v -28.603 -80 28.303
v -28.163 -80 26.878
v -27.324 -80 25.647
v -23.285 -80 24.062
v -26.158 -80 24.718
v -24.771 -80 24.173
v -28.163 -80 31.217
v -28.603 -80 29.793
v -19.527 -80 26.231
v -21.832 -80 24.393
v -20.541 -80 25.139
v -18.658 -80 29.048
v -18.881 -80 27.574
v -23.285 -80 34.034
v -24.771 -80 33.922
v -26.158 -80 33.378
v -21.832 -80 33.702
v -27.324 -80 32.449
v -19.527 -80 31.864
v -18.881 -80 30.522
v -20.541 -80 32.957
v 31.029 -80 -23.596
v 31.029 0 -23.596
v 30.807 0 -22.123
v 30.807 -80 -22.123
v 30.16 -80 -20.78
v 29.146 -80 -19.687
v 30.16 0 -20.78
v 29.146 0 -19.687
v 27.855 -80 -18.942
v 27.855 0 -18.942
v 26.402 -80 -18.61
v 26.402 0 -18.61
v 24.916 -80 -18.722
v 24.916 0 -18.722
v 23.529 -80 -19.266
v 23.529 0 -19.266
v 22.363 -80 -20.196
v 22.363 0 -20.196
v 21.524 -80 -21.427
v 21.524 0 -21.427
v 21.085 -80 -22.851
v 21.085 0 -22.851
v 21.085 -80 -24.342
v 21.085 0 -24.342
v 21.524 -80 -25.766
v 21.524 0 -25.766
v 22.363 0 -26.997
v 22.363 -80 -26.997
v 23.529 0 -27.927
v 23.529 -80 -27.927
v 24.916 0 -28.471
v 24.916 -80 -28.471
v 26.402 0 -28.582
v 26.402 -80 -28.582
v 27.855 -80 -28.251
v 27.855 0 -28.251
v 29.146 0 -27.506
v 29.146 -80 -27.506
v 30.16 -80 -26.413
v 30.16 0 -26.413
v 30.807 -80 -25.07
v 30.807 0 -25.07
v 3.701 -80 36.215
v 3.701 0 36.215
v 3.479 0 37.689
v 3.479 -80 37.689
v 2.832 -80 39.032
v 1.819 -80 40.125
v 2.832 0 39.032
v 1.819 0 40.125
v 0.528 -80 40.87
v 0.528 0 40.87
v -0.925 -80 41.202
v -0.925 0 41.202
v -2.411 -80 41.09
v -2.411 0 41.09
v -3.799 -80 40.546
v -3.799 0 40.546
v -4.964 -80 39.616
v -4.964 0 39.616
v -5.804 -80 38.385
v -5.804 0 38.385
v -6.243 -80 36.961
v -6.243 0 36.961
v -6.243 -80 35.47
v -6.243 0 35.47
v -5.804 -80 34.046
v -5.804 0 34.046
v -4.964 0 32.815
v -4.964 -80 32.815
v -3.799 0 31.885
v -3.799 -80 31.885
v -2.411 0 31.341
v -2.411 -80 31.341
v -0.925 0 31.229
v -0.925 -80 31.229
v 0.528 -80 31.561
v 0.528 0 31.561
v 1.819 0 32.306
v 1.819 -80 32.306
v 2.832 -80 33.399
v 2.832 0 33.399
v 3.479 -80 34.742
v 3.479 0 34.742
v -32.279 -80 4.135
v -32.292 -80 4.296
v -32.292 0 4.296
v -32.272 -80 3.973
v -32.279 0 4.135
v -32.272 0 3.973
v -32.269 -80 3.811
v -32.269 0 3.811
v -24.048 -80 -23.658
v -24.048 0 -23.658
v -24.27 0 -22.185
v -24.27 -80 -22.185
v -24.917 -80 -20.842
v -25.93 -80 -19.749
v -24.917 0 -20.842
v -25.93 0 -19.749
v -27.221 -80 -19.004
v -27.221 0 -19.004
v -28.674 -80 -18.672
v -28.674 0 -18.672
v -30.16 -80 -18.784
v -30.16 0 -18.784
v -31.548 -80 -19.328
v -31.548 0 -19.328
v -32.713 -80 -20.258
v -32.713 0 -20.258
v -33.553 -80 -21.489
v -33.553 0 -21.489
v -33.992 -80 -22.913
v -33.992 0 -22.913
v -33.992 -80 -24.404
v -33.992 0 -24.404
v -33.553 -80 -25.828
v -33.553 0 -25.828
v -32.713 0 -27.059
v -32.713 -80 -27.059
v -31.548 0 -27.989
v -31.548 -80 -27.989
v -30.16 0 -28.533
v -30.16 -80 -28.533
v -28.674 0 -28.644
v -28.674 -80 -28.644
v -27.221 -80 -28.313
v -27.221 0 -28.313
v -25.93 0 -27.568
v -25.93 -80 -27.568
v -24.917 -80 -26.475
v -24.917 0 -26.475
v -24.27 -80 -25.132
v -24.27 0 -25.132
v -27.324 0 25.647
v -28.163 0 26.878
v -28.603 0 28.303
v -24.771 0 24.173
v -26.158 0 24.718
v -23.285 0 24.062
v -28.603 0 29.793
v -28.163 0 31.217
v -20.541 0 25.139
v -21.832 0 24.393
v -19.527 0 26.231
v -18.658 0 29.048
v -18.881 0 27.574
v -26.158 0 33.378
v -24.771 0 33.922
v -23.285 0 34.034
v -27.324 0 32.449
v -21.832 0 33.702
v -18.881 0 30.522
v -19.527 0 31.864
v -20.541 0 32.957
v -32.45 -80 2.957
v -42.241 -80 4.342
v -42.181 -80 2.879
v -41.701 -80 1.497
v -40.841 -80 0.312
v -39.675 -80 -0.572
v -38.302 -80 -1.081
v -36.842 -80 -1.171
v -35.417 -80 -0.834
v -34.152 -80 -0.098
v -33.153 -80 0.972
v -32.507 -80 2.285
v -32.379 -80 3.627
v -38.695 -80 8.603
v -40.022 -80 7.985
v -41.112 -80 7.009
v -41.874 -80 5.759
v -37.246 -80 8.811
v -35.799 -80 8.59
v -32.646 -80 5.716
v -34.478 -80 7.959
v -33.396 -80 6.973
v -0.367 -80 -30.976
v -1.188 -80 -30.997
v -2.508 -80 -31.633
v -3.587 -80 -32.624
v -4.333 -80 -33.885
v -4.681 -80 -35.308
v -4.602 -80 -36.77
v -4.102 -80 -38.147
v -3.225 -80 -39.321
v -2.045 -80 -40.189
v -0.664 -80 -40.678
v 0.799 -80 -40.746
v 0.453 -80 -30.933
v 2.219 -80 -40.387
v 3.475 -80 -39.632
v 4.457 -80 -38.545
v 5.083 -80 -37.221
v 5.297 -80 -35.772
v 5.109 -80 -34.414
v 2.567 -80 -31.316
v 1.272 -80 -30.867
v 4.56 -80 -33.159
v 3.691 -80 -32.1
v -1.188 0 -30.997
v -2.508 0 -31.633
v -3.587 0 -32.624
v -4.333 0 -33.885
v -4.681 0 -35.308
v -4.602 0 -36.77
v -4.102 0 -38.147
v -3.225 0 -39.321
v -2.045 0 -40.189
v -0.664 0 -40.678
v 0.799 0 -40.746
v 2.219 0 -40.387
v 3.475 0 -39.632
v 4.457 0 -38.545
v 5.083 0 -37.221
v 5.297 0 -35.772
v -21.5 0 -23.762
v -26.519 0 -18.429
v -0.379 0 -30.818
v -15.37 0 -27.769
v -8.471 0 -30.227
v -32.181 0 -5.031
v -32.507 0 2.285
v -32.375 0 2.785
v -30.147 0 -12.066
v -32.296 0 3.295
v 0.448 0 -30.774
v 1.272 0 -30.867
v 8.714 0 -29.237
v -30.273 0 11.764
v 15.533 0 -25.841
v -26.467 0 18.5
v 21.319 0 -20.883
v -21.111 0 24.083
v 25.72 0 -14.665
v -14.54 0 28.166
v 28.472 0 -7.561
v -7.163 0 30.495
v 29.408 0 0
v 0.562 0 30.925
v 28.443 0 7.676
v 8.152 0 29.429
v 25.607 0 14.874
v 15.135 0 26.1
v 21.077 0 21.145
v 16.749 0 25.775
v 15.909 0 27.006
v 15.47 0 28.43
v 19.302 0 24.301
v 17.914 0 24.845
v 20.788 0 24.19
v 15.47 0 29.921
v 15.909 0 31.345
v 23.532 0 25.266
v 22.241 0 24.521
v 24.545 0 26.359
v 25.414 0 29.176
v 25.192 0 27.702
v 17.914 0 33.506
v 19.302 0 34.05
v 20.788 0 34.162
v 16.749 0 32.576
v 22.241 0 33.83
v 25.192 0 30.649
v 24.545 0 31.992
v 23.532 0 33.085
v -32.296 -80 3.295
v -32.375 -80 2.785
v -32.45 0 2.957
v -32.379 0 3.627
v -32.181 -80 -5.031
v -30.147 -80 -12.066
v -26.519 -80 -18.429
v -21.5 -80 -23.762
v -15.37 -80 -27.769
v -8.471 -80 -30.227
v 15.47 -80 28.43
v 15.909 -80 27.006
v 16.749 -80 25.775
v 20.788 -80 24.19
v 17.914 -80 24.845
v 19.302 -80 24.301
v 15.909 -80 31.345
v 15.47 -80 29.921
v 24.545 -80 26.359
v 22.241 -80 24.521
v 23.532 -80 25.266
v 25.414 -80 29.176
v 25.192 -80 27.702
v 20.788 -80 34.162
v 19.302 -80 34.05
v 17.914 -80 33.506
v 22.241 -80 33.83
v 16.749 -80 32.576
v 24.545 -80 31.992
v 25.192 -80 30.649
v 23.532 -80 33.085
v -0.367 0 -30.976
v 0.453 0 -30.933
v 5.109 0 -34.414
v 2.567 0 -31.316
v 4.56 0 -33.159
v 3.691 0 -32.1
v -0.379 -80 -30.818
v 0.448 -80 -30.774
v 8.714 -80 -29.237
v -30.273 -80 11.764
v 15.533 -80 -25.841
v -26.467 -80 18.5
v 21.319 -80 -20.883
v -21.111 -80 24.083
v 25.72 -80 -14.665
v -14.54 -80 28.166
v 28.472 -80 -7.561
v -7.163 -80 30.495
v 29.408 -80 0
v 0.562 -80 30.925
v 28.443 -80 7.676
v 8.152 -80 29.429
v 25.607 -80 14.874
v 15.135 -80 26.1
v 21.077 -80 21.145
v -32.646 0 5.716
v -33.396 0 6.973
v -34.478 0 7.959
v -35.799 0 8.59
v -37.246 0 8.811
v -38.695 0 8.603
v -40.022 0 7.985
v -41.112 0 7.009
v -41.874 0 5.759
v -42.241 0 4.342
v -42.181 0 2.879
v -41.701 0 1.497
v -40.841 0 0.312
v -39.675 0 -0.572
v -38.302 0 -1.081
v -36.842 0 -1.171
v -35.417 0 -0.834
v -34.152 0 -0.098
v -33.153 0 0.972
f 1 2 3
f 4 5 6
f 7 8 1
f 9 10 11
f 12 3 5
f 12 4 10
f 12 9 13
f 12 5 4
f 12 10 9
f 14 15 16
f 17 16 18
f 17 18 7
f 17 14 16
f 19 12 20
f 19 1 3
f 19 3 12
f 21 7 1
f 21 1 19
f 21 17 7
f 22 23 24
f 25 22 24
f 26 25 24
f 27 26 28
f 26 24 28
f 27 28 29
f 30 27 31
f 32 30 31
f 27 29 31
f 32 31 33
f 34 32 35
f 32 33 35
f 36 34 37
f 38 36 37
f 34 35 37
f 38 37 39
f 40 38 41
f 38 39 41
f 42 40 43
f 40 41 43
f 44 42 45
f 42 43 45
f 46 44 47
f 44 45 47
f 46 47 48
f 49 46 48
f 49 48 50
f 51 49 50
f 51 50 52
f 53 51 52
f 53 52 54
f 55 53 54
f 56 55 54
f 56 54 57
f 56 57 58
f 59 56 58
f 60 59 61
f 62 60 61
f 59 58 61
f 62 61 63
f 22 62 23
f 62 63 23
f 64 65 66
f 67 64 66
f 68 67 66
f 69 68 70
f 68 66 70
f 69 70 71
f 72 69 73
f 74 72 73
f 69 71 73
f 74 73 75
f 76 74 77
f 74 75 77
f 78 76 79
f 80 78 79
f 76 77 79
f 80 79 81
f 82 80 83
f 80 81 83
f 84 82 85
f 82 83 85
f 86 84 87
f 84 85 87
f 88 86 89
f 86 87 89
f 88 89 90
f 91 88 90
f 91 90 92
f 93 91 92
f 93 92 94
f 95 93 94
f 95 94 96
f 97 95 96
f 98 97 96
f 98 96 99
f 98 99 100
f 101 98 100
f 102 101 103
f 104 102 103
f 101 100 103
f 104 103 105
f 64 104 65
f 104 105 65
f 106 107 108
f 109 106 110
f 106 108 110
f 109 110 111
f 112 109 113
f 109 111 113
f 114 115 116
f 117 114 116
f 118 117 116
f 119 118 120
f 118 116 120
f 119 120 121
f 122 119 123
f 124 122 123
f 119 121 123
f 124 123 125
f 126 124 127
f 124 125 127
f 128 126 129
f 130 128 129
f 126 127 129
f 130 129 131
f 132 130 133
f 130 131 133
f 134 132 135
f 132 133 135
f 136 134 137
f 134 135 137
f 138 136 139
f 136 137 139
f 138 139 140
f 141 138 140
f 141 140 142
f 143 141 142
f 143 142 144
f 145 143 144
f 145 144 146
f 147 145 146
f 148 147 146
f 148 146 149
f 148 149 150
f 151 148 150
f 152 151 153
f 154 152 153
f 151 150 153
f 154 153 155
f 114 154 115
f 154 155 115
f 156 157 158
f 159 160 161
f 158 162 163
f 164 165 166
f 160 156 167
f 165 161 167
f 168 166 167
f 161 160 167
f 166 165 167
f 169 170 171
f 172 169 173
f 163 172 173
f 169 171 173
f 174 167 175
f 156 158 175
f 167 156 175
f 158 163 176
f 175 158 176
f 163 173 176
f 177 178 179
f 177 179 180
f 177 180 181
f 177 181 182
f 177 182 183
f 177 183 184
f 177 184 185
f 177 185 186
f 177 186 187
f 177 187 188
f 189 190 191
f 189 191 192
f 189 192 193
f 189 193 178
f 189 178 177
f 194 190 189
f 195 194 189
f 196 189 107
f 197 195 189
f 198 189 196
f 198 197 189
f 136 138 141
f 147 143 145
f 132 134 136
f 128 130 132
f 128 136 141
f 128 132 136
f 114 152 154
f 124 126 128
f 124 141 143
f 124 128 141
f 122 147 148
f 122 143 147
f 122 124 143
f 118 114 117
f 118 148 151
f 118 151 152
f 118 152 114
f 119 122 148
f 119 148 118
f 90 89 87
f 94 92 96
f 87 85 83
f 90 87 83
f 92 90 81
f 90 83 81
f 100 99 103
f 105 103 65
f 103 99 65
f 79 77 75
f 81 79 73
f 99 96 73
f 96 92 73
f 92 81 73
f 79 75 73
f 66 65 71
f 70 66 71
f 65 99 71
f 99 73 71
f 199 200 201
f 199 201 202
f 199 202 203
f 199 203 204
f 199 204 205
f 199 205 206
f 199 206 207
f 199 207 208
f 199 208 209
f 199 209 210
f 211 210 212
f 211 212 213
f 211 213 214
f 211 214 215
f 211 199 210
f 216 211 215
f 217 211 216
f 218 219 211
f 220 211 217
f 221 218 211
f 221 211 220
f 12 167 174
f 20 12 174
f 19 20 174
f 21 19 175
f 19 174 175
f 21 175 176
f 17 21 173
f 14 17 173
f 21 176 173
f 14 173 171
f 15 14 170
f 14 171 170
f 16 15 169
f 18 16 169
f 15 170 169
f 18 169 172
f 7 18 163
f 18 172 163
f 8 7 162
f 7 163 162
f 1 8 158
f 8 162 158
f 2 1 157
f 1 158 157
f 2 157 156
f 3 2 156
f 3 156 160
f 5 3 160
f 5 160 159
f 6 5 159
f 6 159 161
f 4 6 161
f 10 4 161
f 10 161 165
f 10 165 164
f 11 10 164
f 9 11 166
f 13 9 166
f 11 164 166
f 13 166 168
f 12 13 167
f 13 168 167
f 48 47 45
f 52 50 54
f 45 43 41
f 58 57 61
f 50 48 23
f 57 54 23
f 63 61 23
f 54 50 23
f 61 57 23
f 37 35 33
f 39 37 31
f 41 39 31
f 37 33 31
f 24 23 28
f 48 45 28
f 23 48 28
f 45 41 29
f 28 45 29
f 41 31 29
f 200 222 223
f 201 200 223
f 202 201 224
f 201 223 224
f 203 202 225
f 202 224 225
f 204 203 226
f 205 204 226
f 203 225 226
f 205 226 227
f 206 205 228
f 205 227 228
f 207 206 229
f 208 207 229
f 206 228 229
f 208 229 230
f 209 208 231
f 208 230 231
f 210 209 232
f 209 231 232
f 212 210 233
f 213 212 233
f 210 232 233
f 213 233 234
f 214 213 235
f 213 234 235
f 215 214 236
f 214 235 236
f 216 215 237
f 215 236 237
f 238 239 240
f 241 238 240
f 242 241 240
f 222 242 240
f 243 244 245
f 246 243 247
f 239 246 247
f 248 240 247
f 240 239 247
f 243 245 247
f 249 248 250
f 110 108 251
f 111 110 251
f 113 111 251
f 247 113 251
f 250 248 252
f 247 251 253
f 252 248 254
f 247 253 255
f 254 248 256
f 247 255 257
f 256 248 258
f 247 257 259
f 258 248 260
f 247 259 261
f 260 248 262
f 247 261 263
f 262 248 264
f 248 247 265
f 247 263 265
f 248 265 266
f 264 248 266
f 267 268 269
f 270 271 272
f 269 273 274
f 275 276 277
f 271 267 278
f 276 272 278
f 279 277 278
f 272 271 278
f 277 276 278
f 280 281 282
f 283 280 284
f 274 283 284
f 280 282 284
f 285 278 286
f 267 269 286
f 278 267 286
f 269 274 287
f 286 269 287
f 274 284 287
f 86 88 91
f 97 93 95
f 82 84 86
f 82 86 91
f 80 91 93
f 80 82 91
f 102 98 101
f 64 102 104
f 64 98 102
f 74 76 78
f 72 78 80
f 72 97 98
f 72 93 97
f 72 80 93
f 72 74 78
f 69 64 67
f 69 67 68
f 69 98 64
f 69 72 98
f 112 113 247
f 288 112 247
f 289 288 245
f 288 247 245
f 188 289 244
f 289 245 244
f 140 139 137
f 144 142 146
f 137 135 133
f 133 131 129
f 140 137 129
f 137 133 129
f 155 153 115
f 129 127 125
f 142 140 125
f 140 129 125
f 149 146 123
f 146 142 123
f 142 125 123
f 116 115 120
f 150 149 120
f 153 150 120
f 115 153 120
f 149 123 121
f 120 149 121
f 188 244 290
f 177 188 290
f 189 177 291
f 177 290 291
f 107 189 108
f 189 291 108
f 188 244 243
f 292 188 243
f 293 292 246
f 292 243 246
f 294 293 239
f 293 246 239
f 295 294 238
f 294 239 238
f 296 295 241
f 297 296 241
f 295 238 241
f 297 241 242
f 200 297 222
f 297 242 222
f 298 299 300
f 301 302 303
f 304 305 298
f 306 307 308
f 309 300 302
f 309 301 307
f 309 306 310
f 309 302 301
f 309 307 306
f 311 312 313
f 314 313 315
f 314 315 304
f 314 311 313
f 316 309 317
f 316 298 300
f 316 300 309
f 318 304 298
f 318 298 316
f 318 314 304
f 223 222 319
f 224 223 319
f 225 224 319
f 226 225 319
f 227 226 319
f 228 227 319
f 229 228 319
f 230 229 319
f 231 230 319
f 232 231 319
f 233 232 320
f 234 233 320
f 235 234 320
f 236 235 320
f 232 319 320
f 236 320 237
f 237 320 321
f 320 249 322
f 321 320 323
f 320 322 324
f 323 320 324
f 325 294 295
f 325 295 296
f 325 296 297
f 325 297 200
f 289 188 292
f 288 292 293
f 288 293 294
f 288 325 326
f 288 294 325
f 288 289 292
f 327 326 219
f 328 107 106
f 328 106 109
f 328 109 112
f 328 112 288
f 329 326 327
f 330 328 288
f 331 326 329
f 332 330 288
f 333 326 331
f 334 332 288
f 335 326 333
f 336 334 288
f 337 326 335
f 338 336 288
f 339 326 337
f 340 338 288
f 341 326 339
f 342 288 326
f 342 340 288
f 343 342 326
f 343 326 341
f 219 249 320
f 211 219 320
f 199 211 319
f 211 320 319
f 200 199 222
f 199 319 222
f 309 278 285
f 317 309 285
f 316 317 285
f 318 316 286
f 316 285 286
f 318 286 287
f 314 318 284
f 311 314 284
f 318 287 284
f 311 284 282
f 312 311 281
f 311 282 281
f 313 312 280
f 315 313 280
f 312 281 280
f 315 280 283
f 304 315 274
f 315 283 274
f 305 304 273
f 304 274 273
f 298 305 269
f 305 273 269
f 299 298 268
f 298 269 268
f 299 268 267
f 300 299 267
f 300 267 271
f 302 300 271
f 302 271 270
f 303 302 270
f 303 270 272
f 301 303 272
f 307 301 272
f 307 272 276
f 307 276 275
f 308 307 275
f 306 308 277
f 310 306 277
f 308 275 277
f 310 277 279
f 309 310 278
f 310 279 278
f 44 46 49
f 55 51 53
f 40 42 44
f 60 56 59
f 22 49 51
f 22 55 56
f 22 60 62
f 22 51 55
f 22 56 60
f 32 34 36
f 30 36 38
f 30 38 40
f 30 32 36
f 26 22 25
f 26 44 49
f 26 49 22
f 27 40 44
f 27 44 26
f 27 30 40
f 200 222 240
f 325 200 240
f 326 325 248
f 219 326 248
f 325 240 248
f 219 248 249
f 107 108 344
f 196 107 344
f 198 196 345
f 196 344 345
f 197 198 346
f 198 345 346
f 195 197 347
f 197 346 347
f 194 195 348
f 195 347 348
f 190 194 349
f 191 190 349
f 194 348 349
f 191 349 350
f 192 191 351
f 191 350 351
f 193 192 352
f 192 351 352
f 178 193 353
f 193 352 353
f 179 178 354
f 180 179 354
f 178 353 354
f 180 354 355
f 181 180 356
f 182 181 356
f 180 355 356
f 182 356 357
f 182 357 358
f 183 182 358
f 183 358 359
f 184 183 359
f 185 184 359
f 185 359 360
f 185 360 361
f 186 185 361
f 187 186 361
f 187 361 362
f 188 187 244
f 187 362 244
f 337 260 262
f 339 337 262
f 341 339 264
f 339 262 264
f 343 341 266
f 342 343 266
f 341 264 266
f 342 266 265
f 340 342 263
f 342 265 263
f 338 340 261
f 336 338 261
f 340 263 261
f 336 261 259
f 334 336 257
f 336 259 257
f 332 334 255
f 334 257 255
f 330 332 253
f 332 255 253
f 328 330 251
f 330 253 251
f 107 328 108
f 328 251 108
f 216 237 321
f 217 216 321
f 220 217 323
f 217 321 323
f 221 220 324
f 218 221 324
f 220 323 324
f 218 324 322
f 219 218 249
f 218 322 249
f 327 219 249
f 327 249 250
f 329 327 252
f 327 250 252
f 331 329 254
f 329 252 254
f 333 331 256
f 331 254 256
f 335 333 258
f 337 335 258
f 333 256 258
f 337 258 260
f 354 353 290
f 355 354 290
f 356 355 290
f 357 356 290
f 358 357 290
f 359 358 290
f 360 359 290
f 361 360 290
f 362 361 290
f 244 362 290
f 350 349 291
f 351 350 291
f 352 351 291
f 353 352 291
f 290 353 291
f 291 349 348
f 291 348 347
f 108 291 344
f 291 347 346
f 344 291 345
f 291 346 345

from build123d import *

# Parameters (mm, degrees)
F1_DEPTH = 80
F0_R     = 5


with BuildPart() as f1:
    # F0 (on Front) → F1 (new body)
    with BuildSketch(Plane.XZ):
        with BuildLine():
            ThreePointArc((1.2717998454, -30.8674716863), (21.3187032133, -20.8834130919), (29.4083767724, 0))
            ThreePointArc((29.4083767724, 0), (0.5616103001, 30.9251287043), (-32.2924997034, 4.2960660629))
            ThreePointArc((-32.2924997034, 4.2960660629), (-32.274802335, 4.05373467), (-32.2688985649, 3.810829655))
            ThreePointArc((-32.2688985649, 3.810829655), (-32.3288490863, 3.0388768397), (-32.5072630246, 2.2854356139))
            ThreePointArc((-32.5072630246, 2.2854356139), (-24.1679170215, -21.2440805528), (-1.1884477149, -30.997378107))
            ThreePointArc((-1.1884477149, -30.997378107), (0.0335496433, -30.7785217279), (1.2717998454, -30.8674716863))
        make_face()
    extrude(amount=F1_DEPTH)


with BuildPart() as f1b:
    # F0 (on Front) → F1, piece 2 (new body)
    with BuildSketch(Plane.XZ):
        with BuildLine():
            ThreePointArc((-32.5072630246, 2.2854356139), (-32.4162793992, 3.2925023768), (-32.2924997034, 4.2960660629))
            ThreePointArc((-32.2924997034, 4.2960660629), (-42.2406173023, 4.3418784255), (-32.5072630246, 2.2854356139))
        make_face()
    extrude(amount=F1_DEPTH)


with BuildPart() as f1c:
    # F0 (on Front) → F1, piece 3 (new body)
    with BuildSketch(Plane.XZ):
        with BuildLine():
            ThreePointArc((5.2971932426, -35.771566095), (4.1619722152, -32.5992666935), (1.2717998454, -30.8674716863))
            ThreePointArc((1.2717998454, -30.8674716863), (0.0429670879, -30.9568750765), (-1.1884477149, -30.997378107))
            ThreePointArc((-1.1884477149, -30.997378107), (-2.6669082413, -39.7982399574), (5.2971932426, -35.771566095))
        make_face()
    extrude(amount=F1_DEPTH)


with BuildPart() as f1d:
    # F0 (on Front) → F1, piece 4 (new body)
    with BuildSketch(Plane.XZ):
        with Locations((-23.6584274116, 29.0477543936)):
            Circle(F0_R)
    extrude(amount=F1_DEPTH)


with BuildPart() as f1e:
    # F0 (on Front) → F1, piece 5 (new body)
    with BuildSketch(Plane.XZ):
        with Locations((-29.0477543936, -23.6584274116)):
            Circle(F0_R)
    extrude(amount=F1_DEPTH)


with BuildPart() as f1f:
    # F0 (on Front) → F1, piece 6 (new body)
    with BuildSketch(Plane.XZ):
        with Locations((20.4142962822, 29.1755563039)):
            Circle(F0_R)
    extrude(amount=F1_DEPTH)


with BuildPart() as f1g:
    # F0 (on Front) → F1, piece 7 (new body)
    with BuildSketch(Plane.XZ):
        with Locations((26.028754213, -23.5964425308)):
            Circle(F0_R)
    extrude(amount=F1_DEPTH)


with BuildPart() as f1h:
    # F0 (on Front) → F1, piece 8 (new body)
    with BuildSketch(Plane.XZ):
        with Locations((-1.2987746409, 36.2154911415)):
            Circle(F0_R)
    extrude(amount=F1_DEPTH)


solid = Compound([f1.part, f1b.part, f1c.part, f1d.part, f1e.part, f1f.part, f1g.part, f1h.part])
